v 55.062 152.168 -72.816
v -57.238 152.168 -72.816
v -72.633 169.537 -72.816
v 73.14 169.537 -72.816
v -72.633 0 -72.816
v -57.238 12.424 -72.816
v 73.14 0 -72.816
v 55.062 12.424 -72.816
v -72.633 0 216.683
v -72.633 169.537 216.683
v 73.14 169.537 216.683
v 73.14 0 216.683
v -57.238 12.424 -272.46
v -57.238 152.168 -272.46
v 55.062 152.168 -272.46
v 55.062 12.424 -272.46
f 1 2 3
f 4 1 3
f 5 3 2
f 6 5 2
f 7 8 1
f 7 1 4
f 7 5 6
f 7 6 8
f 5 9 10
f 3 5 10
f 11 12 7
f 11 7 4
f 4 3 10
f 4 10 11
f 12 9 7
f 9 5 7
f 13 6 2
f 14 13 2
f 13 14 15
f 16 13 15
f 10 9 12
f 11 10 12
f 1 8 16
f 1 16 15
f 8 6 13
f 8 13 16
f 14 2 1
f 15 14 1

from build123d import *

# Parameters (mm, degrees)
F0_W     = 145.7732766867
F0_H     = 72.8164315224
F1_DEPTH = 169.5371419191
F2_DEPTH = 25.4
F3_DEPTH = 191.2825796753
F4_W     = 112.2992113233
F4_H     = 139.7446542978
F5_DEPTH = 489.1429543495


with BuildPart() as f1:
    # F0 (on Front) → F1 (new body)
    with BuildSketch(Plane.XZ):
        with Locations((0.2535507083, -36.4082157612)):
            Rectangle(F0_W, F0_H)
    extrude(amount=-F1_DEPTH)

    # F2 (add): a face of the model
    f2_faces = [f1.faces().sort_by_distance(p)[0] for p in [
        (0.2535507083, 84.7685709596, 0),
    ]]
    extrude(f2_faces, amount=F2_DEPTH)

    # F3 (add): a face of the model
    f3_faces = [f1.faces().sort_by_distance(p)[0] for p in [
        (0.2535507083, 84.7685709596, 25.4),
    ]]
    extrude(f3_faces, amount=F3_DEPTH)

    # F4 (on face) → F5 (join)
    with BuildSketch(Plane.XY.offset(216.6825796753)):
        with Locations((-1.0879933834, 82.2958871722)):
            Rectangle(F4_W, F4_H)
    extrude(amount=-F5_DEPTH)


solid = f1.part
